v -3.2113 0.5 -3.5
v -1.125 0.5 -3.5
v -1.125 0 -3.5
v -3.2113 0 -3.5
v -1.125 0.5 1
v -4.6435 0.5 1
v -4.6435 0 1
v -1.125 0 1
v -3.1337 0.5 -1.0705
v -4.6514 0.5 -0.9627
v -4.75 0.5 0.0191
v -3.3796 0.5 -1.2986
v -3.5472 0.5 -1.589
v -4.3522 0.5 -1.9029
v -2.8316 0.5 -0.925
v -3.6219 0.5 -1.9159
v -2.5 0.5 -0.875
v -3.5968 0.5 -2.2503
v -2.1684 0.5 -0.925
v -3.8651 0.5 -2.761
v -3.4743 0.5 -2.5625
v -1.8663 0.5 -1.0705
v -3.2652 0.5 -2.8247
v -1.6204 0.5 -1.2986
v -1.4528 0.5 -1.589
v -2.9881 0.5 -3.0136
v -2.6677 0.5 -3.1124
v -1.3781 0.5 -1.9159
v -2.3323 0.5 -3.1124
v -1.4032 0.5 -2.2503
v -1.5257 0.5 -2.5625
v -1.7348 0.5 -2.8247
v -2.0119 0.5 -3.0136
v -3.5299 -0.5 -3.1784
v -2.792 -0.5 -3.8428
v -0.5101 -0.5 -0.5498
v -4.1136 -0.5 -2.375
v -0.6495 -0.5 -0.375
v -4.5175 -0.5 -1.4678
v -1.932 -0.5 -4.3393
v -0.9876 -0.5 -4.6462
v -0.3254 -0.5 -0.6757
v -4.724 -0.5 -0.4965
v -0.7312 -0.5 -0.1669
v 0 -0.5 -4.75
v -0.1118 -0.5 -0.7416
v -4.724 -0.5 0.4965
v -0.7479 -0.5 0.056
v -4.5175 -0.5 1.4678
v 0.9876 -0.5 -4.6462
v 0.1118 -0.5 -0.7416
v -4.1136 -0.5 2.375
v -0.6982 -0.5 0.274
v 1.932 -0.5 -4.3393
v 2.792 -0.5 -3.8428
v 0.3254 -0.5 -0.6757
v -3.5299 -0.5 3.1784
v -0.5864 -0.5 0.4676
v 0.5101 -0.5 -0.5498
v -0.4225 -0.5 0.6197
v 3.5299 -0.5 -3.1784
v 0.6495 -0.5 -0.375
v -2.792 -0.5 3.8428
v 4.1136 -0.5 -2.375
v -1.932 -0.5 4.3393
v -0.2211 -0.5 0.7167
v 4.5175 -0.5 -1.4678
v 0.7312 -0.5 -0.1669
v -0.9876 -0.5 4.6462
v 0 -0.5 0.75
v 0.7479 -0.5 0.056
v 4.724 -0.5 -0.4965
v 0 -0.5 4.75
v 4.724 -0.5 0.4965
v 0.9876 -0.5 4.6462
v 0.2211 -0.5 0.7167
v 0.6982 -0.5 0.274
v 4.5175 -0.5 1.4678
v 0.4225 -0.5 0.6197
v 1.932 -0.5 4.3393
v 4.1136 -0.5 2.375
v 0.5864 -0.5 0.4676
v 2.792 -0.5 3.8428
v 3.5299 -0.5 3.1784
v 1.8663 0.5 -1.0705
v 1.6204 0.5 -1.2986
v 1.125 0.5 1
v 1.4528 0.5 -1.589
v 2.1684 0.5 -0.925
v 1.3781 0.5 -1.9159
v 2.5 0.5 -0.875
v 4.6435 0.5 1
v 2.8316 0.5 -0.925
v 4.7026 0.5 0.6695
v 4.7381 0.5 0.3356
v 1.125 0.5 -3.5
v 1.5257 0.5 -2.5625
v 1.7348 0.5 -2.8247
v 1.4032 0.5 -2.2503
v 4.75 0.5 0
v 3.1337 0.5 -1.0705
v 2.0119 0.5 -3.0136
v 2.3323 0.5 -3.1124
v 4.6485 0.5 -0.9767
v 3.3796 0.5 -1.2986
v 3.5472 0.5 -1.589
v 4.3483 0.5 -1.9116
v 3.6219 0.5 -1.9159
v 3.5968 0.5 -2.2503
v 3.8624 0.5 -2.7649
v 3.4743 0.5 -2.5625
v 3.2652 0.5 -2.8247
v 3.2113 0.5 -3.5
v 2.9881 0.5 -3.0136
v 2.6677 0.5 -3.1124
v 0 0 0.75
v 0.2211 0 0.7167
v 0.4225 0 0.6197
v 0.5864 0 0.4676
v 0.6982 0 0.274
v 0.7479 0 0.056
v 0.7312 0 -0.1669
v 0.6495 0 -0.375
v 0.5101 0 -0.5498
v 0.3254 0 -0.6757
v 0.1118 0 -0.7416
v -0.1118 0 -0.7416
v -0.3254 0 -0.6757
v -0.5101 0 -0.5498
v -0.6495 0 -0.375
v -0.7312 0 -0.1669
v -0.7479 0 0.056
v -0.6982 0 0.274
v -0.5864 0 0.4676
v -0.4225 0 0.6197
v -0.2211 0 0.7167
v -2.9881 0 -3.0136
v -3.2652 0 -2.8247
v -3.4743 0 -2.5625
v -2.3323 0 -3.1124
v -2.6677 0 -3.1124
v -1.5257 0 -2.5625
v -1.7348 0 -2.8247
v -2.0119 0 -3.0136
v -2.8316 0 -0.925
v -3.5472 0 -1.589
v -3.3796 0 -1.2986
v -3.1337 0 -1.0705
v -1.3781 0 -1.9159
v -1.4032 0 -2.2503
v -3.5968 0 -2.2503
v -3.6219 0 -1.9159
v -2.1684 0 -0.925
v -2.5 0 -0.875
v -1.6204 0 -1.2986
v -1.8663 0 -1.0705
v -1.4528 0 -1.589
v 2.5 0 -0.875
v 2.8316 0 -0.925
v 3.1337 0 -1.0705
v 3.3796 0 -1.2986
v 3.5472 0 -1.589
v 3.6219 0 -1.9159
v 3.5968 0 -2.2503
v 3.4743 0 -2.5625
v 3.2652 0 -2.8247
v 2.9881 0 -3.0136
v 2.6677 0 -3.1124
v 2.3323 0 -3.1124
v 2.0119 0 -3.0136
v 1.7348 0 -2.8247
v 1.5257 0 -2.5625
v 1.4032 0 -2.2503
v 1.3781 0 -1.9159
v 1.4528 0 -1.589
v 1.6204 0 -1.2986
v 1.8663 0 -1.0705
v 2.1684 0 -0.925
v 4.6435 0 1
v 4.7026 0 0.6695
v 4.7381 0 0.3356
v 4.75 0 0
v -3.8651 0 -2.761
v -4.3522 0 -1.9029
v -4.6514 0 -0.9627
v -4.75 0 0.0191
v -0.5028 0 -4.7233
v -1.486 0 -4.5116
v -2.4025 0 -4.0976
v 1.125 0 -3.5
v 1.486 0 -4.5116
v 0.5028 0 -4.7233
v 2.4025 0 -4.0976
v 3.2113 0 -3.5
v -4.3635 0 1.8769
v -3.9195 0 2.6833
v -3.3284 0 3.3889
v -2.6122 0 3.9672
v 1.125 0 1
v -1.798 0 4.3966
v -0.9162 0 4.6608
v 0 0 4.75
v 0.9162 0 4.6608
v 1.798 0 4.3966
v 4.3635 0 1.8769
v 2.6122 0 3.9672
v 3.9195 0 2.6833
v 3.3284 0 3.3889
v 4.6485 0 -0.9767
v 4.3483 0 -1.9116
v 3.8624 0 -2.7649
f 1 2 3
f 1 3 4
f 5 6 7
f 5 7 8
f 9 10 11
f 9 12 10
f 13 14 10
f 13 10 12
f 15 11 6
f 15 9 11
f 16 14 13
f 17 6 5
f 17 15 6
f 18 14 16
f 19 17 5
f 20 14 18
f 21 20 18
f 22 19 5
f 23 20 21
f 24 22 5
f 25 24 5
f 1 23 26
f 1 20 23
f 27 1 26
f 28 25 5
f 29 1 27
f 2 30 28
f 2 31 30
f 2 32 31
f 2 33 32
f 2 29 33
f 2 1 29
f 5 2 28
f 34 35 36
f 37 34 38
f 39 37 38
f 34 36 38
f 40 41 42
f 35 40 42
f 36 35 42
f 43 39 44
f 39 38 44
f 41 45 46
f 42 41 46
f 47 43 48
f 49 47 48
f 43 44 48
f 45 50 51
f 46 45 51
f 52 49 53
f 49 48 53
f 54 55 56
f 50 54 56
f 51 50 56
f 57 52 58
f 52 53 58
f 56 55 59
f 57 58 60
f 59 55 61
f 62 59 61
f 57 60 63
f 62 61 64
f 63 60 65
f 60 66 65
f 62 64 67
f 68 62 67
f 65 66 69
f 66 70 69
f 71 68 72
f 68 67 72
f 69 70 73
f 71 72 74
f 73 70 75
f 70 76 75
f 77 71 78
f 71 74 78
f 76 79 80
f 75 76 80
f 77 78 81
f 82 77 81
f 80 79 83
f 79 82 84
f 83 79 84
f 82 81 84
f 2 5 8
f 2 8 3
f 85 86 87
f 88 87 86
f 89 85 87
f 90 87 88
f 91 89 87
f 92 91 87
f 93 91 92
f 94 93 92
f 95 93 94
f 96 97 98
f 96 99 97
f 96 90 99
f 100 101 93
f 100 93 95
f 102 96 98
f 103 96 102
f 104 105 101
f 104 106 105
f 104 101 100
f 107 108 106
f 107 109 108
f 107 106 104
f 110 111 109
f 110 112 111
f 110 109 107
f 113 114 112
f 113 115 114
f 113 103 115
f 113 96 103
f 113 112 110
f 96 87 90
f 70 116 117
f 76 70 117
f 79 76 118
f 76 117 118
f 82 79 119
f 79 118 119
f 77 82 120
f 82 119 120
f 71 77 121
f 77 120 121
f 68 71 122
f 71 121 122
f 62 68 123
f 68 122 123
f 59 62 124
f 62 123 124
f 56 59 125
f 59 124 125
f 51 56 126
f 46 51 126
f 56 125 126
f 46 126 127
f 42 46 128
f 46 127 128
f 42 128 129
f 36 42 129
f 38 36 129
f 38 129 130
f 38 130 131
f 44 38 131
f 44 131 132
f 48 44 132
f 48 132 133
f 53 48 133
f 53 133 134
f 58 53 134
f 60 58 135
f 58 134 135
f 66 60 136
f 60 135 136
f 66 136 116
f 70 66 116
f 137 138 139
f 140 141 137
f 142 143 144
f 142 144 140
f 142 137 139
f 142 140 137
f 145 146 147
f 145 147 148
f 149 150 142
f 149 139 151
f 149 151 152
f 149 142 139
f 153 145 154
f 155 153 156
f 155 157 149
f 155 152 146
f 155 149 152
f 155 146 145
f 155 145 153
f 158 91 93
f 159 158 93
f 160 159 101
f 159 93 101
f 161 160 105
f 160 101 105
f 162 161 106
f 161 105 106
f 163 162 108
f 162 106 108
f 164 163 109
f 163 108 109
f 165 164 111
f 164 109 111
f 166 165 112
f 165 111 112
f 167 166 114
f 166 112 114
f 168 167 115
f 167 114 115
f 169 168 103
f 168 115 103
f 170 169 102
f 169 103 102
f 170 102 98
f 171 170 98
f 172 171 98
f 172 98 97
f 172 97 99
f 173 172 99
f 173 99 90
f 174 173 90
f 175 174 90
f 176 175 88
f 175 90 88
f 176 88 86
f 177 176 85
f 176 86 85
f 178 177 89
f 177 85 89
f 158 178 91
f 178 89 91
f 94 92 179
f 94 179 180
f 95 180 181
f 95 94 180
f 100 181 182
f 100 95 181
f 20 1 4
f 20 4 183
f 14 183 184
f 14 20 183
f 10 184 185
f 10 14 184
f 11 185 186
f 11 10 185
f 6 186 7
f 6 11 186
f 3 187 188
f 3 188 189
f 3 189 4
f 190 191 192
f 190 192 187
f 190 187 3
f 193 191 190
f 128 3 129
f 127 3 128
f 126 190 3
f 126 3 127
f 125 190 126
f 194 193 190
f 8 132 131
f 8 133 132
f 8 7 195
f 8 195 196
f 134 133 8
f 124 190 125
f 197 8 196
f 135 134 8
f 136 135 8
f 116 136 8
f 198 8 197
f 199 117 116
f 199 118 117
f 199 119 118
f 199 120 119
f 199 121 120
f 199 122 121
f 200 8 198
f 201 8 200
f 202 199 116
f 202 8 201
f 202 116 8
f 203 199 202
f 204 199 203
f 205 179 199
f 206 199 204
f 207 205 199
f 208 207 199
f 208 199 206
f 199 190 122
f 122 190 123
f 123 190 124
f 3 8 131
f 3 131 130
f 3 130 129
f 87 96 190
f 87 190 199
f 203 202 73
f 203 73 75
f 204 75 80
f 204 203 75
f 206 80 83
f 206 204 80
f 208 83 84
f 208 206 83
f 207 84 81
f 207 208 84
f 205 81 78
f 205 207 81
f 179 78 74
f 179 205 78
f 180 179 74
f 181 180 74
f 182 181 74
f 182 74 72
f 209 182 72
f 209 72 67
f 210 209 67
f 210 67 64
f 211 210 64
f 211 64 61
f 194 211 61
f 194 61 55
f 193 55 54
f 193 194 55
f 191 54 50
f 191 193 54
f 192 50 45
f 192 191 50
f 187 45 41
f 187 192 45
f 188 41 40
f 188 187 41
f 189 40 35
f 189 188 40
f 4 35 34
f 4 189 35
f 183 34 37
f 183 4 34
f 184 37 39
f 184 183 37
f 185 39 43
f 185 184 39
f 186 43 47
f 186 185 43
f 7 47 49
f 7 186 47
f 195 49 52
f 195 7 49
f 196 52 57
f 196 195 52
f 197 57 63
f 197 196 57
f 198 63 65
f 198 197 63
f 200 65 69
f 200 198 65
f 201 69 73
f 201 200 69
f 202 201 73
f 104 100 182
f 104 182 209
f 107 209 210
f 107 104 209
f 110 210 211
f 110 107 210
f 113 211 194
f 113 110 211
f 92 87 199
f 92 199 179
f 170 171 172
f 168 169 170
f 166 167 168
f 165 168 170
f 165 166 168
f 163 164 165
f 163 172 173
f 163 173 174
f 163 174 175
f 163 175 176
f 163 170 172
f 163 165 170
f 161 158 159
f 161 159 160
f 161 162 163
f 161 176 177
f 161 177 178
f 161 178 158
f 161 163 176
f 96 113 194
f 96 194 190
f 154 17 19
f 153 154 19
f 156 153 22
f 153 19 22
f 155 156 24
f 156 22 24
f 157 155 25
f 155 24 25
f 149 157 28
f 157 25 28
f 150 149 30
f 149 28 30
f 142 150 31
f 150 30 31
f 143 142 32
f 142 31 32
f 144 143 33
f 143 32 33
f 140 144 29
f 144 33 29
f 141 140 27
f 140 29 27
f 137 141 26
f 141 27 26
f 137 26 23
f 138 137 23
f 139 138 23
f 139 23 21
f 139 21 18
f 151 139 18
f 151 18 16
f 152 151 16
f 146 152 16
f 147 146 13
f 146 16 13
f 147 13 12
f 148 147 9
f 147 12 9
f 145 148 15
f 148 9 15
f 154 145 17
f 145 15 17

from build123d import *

# Parameters (mm, degrees)
SKETCH_1_R      = 4.75
SKETCH_1_R_2    = 0.75
EXTRUDE_1_DEPTH = 0.5
EXTRUDE_START   = 0.5
SKETCH_1_3_R    = 1.125
EXTRUDE_2_DEPTH = 0.5


with BuildPart() as part:
    # 草图1 → 凸台-拉伸1 (new body)
    with BuildSketch(Plane(origin=(0, 0, 0), x_dir=(1, 0, 0), z_dir=(0, 1, 0))):
        Circle(SKETCH_1_R)
        Circle(SKETCH_1_R_2, mode=Mode.SUBTRACT)
    extrude(amount=-EXTRUDE_1_DEPTH)

    # 草图1<3> → 凸台-拉伸2 (add)
    # profile 1 of 2: a face of its own
    with BuildSketch(Plane(origin=(0, 0, 0), x_dir=(1, 0, 0), z_dir=(0, 1, 0)).offset(EXTRUDE_START)):
        with BuildLine():
            Line((1.125, -1), (4.643543905, -1))
            ThreePointArc((4.643543905, -1), (4.526276083, 1.440598771), (3.211308145, 3.5))
            Line((3.211308145, 3.5), (1.125, 3.5))
            Line((1.125, 3.5), (1.125, -1))
        make_face()
        with Locations((2.5, 2)):
            Circle(SKETCH_1_3_R, mode=Mode.SUBTRACT)
    # profile 2 of 2: a face of its own
    with BuildSketch(Plane(origin=(0, 0, 0), x_dir=(1, 0, 0), z_dir=(0, 1, 0)).offset(EXTRUDE_START)):
        with BuildLine():
            ThreePointArc((-3.211308145, 3.5), (-4.526276083, 1.440598771), (-4.643543905, -1))
            Line((-4.643543905, -1), (-1.125, -1))
            Line((-1.125, -1), (-1.125, 3.5))
            Line((-1.125, 3.5), (-3.211308145, 3.5))
        make_face()
        with Locations((-2.5, 2)):
            Circle(SKETCH_1_3_R, mode=Mode.SUBTRACT)
    extrude(amount=-EXTRUDE_2_DEPTH)


solid = part.part
